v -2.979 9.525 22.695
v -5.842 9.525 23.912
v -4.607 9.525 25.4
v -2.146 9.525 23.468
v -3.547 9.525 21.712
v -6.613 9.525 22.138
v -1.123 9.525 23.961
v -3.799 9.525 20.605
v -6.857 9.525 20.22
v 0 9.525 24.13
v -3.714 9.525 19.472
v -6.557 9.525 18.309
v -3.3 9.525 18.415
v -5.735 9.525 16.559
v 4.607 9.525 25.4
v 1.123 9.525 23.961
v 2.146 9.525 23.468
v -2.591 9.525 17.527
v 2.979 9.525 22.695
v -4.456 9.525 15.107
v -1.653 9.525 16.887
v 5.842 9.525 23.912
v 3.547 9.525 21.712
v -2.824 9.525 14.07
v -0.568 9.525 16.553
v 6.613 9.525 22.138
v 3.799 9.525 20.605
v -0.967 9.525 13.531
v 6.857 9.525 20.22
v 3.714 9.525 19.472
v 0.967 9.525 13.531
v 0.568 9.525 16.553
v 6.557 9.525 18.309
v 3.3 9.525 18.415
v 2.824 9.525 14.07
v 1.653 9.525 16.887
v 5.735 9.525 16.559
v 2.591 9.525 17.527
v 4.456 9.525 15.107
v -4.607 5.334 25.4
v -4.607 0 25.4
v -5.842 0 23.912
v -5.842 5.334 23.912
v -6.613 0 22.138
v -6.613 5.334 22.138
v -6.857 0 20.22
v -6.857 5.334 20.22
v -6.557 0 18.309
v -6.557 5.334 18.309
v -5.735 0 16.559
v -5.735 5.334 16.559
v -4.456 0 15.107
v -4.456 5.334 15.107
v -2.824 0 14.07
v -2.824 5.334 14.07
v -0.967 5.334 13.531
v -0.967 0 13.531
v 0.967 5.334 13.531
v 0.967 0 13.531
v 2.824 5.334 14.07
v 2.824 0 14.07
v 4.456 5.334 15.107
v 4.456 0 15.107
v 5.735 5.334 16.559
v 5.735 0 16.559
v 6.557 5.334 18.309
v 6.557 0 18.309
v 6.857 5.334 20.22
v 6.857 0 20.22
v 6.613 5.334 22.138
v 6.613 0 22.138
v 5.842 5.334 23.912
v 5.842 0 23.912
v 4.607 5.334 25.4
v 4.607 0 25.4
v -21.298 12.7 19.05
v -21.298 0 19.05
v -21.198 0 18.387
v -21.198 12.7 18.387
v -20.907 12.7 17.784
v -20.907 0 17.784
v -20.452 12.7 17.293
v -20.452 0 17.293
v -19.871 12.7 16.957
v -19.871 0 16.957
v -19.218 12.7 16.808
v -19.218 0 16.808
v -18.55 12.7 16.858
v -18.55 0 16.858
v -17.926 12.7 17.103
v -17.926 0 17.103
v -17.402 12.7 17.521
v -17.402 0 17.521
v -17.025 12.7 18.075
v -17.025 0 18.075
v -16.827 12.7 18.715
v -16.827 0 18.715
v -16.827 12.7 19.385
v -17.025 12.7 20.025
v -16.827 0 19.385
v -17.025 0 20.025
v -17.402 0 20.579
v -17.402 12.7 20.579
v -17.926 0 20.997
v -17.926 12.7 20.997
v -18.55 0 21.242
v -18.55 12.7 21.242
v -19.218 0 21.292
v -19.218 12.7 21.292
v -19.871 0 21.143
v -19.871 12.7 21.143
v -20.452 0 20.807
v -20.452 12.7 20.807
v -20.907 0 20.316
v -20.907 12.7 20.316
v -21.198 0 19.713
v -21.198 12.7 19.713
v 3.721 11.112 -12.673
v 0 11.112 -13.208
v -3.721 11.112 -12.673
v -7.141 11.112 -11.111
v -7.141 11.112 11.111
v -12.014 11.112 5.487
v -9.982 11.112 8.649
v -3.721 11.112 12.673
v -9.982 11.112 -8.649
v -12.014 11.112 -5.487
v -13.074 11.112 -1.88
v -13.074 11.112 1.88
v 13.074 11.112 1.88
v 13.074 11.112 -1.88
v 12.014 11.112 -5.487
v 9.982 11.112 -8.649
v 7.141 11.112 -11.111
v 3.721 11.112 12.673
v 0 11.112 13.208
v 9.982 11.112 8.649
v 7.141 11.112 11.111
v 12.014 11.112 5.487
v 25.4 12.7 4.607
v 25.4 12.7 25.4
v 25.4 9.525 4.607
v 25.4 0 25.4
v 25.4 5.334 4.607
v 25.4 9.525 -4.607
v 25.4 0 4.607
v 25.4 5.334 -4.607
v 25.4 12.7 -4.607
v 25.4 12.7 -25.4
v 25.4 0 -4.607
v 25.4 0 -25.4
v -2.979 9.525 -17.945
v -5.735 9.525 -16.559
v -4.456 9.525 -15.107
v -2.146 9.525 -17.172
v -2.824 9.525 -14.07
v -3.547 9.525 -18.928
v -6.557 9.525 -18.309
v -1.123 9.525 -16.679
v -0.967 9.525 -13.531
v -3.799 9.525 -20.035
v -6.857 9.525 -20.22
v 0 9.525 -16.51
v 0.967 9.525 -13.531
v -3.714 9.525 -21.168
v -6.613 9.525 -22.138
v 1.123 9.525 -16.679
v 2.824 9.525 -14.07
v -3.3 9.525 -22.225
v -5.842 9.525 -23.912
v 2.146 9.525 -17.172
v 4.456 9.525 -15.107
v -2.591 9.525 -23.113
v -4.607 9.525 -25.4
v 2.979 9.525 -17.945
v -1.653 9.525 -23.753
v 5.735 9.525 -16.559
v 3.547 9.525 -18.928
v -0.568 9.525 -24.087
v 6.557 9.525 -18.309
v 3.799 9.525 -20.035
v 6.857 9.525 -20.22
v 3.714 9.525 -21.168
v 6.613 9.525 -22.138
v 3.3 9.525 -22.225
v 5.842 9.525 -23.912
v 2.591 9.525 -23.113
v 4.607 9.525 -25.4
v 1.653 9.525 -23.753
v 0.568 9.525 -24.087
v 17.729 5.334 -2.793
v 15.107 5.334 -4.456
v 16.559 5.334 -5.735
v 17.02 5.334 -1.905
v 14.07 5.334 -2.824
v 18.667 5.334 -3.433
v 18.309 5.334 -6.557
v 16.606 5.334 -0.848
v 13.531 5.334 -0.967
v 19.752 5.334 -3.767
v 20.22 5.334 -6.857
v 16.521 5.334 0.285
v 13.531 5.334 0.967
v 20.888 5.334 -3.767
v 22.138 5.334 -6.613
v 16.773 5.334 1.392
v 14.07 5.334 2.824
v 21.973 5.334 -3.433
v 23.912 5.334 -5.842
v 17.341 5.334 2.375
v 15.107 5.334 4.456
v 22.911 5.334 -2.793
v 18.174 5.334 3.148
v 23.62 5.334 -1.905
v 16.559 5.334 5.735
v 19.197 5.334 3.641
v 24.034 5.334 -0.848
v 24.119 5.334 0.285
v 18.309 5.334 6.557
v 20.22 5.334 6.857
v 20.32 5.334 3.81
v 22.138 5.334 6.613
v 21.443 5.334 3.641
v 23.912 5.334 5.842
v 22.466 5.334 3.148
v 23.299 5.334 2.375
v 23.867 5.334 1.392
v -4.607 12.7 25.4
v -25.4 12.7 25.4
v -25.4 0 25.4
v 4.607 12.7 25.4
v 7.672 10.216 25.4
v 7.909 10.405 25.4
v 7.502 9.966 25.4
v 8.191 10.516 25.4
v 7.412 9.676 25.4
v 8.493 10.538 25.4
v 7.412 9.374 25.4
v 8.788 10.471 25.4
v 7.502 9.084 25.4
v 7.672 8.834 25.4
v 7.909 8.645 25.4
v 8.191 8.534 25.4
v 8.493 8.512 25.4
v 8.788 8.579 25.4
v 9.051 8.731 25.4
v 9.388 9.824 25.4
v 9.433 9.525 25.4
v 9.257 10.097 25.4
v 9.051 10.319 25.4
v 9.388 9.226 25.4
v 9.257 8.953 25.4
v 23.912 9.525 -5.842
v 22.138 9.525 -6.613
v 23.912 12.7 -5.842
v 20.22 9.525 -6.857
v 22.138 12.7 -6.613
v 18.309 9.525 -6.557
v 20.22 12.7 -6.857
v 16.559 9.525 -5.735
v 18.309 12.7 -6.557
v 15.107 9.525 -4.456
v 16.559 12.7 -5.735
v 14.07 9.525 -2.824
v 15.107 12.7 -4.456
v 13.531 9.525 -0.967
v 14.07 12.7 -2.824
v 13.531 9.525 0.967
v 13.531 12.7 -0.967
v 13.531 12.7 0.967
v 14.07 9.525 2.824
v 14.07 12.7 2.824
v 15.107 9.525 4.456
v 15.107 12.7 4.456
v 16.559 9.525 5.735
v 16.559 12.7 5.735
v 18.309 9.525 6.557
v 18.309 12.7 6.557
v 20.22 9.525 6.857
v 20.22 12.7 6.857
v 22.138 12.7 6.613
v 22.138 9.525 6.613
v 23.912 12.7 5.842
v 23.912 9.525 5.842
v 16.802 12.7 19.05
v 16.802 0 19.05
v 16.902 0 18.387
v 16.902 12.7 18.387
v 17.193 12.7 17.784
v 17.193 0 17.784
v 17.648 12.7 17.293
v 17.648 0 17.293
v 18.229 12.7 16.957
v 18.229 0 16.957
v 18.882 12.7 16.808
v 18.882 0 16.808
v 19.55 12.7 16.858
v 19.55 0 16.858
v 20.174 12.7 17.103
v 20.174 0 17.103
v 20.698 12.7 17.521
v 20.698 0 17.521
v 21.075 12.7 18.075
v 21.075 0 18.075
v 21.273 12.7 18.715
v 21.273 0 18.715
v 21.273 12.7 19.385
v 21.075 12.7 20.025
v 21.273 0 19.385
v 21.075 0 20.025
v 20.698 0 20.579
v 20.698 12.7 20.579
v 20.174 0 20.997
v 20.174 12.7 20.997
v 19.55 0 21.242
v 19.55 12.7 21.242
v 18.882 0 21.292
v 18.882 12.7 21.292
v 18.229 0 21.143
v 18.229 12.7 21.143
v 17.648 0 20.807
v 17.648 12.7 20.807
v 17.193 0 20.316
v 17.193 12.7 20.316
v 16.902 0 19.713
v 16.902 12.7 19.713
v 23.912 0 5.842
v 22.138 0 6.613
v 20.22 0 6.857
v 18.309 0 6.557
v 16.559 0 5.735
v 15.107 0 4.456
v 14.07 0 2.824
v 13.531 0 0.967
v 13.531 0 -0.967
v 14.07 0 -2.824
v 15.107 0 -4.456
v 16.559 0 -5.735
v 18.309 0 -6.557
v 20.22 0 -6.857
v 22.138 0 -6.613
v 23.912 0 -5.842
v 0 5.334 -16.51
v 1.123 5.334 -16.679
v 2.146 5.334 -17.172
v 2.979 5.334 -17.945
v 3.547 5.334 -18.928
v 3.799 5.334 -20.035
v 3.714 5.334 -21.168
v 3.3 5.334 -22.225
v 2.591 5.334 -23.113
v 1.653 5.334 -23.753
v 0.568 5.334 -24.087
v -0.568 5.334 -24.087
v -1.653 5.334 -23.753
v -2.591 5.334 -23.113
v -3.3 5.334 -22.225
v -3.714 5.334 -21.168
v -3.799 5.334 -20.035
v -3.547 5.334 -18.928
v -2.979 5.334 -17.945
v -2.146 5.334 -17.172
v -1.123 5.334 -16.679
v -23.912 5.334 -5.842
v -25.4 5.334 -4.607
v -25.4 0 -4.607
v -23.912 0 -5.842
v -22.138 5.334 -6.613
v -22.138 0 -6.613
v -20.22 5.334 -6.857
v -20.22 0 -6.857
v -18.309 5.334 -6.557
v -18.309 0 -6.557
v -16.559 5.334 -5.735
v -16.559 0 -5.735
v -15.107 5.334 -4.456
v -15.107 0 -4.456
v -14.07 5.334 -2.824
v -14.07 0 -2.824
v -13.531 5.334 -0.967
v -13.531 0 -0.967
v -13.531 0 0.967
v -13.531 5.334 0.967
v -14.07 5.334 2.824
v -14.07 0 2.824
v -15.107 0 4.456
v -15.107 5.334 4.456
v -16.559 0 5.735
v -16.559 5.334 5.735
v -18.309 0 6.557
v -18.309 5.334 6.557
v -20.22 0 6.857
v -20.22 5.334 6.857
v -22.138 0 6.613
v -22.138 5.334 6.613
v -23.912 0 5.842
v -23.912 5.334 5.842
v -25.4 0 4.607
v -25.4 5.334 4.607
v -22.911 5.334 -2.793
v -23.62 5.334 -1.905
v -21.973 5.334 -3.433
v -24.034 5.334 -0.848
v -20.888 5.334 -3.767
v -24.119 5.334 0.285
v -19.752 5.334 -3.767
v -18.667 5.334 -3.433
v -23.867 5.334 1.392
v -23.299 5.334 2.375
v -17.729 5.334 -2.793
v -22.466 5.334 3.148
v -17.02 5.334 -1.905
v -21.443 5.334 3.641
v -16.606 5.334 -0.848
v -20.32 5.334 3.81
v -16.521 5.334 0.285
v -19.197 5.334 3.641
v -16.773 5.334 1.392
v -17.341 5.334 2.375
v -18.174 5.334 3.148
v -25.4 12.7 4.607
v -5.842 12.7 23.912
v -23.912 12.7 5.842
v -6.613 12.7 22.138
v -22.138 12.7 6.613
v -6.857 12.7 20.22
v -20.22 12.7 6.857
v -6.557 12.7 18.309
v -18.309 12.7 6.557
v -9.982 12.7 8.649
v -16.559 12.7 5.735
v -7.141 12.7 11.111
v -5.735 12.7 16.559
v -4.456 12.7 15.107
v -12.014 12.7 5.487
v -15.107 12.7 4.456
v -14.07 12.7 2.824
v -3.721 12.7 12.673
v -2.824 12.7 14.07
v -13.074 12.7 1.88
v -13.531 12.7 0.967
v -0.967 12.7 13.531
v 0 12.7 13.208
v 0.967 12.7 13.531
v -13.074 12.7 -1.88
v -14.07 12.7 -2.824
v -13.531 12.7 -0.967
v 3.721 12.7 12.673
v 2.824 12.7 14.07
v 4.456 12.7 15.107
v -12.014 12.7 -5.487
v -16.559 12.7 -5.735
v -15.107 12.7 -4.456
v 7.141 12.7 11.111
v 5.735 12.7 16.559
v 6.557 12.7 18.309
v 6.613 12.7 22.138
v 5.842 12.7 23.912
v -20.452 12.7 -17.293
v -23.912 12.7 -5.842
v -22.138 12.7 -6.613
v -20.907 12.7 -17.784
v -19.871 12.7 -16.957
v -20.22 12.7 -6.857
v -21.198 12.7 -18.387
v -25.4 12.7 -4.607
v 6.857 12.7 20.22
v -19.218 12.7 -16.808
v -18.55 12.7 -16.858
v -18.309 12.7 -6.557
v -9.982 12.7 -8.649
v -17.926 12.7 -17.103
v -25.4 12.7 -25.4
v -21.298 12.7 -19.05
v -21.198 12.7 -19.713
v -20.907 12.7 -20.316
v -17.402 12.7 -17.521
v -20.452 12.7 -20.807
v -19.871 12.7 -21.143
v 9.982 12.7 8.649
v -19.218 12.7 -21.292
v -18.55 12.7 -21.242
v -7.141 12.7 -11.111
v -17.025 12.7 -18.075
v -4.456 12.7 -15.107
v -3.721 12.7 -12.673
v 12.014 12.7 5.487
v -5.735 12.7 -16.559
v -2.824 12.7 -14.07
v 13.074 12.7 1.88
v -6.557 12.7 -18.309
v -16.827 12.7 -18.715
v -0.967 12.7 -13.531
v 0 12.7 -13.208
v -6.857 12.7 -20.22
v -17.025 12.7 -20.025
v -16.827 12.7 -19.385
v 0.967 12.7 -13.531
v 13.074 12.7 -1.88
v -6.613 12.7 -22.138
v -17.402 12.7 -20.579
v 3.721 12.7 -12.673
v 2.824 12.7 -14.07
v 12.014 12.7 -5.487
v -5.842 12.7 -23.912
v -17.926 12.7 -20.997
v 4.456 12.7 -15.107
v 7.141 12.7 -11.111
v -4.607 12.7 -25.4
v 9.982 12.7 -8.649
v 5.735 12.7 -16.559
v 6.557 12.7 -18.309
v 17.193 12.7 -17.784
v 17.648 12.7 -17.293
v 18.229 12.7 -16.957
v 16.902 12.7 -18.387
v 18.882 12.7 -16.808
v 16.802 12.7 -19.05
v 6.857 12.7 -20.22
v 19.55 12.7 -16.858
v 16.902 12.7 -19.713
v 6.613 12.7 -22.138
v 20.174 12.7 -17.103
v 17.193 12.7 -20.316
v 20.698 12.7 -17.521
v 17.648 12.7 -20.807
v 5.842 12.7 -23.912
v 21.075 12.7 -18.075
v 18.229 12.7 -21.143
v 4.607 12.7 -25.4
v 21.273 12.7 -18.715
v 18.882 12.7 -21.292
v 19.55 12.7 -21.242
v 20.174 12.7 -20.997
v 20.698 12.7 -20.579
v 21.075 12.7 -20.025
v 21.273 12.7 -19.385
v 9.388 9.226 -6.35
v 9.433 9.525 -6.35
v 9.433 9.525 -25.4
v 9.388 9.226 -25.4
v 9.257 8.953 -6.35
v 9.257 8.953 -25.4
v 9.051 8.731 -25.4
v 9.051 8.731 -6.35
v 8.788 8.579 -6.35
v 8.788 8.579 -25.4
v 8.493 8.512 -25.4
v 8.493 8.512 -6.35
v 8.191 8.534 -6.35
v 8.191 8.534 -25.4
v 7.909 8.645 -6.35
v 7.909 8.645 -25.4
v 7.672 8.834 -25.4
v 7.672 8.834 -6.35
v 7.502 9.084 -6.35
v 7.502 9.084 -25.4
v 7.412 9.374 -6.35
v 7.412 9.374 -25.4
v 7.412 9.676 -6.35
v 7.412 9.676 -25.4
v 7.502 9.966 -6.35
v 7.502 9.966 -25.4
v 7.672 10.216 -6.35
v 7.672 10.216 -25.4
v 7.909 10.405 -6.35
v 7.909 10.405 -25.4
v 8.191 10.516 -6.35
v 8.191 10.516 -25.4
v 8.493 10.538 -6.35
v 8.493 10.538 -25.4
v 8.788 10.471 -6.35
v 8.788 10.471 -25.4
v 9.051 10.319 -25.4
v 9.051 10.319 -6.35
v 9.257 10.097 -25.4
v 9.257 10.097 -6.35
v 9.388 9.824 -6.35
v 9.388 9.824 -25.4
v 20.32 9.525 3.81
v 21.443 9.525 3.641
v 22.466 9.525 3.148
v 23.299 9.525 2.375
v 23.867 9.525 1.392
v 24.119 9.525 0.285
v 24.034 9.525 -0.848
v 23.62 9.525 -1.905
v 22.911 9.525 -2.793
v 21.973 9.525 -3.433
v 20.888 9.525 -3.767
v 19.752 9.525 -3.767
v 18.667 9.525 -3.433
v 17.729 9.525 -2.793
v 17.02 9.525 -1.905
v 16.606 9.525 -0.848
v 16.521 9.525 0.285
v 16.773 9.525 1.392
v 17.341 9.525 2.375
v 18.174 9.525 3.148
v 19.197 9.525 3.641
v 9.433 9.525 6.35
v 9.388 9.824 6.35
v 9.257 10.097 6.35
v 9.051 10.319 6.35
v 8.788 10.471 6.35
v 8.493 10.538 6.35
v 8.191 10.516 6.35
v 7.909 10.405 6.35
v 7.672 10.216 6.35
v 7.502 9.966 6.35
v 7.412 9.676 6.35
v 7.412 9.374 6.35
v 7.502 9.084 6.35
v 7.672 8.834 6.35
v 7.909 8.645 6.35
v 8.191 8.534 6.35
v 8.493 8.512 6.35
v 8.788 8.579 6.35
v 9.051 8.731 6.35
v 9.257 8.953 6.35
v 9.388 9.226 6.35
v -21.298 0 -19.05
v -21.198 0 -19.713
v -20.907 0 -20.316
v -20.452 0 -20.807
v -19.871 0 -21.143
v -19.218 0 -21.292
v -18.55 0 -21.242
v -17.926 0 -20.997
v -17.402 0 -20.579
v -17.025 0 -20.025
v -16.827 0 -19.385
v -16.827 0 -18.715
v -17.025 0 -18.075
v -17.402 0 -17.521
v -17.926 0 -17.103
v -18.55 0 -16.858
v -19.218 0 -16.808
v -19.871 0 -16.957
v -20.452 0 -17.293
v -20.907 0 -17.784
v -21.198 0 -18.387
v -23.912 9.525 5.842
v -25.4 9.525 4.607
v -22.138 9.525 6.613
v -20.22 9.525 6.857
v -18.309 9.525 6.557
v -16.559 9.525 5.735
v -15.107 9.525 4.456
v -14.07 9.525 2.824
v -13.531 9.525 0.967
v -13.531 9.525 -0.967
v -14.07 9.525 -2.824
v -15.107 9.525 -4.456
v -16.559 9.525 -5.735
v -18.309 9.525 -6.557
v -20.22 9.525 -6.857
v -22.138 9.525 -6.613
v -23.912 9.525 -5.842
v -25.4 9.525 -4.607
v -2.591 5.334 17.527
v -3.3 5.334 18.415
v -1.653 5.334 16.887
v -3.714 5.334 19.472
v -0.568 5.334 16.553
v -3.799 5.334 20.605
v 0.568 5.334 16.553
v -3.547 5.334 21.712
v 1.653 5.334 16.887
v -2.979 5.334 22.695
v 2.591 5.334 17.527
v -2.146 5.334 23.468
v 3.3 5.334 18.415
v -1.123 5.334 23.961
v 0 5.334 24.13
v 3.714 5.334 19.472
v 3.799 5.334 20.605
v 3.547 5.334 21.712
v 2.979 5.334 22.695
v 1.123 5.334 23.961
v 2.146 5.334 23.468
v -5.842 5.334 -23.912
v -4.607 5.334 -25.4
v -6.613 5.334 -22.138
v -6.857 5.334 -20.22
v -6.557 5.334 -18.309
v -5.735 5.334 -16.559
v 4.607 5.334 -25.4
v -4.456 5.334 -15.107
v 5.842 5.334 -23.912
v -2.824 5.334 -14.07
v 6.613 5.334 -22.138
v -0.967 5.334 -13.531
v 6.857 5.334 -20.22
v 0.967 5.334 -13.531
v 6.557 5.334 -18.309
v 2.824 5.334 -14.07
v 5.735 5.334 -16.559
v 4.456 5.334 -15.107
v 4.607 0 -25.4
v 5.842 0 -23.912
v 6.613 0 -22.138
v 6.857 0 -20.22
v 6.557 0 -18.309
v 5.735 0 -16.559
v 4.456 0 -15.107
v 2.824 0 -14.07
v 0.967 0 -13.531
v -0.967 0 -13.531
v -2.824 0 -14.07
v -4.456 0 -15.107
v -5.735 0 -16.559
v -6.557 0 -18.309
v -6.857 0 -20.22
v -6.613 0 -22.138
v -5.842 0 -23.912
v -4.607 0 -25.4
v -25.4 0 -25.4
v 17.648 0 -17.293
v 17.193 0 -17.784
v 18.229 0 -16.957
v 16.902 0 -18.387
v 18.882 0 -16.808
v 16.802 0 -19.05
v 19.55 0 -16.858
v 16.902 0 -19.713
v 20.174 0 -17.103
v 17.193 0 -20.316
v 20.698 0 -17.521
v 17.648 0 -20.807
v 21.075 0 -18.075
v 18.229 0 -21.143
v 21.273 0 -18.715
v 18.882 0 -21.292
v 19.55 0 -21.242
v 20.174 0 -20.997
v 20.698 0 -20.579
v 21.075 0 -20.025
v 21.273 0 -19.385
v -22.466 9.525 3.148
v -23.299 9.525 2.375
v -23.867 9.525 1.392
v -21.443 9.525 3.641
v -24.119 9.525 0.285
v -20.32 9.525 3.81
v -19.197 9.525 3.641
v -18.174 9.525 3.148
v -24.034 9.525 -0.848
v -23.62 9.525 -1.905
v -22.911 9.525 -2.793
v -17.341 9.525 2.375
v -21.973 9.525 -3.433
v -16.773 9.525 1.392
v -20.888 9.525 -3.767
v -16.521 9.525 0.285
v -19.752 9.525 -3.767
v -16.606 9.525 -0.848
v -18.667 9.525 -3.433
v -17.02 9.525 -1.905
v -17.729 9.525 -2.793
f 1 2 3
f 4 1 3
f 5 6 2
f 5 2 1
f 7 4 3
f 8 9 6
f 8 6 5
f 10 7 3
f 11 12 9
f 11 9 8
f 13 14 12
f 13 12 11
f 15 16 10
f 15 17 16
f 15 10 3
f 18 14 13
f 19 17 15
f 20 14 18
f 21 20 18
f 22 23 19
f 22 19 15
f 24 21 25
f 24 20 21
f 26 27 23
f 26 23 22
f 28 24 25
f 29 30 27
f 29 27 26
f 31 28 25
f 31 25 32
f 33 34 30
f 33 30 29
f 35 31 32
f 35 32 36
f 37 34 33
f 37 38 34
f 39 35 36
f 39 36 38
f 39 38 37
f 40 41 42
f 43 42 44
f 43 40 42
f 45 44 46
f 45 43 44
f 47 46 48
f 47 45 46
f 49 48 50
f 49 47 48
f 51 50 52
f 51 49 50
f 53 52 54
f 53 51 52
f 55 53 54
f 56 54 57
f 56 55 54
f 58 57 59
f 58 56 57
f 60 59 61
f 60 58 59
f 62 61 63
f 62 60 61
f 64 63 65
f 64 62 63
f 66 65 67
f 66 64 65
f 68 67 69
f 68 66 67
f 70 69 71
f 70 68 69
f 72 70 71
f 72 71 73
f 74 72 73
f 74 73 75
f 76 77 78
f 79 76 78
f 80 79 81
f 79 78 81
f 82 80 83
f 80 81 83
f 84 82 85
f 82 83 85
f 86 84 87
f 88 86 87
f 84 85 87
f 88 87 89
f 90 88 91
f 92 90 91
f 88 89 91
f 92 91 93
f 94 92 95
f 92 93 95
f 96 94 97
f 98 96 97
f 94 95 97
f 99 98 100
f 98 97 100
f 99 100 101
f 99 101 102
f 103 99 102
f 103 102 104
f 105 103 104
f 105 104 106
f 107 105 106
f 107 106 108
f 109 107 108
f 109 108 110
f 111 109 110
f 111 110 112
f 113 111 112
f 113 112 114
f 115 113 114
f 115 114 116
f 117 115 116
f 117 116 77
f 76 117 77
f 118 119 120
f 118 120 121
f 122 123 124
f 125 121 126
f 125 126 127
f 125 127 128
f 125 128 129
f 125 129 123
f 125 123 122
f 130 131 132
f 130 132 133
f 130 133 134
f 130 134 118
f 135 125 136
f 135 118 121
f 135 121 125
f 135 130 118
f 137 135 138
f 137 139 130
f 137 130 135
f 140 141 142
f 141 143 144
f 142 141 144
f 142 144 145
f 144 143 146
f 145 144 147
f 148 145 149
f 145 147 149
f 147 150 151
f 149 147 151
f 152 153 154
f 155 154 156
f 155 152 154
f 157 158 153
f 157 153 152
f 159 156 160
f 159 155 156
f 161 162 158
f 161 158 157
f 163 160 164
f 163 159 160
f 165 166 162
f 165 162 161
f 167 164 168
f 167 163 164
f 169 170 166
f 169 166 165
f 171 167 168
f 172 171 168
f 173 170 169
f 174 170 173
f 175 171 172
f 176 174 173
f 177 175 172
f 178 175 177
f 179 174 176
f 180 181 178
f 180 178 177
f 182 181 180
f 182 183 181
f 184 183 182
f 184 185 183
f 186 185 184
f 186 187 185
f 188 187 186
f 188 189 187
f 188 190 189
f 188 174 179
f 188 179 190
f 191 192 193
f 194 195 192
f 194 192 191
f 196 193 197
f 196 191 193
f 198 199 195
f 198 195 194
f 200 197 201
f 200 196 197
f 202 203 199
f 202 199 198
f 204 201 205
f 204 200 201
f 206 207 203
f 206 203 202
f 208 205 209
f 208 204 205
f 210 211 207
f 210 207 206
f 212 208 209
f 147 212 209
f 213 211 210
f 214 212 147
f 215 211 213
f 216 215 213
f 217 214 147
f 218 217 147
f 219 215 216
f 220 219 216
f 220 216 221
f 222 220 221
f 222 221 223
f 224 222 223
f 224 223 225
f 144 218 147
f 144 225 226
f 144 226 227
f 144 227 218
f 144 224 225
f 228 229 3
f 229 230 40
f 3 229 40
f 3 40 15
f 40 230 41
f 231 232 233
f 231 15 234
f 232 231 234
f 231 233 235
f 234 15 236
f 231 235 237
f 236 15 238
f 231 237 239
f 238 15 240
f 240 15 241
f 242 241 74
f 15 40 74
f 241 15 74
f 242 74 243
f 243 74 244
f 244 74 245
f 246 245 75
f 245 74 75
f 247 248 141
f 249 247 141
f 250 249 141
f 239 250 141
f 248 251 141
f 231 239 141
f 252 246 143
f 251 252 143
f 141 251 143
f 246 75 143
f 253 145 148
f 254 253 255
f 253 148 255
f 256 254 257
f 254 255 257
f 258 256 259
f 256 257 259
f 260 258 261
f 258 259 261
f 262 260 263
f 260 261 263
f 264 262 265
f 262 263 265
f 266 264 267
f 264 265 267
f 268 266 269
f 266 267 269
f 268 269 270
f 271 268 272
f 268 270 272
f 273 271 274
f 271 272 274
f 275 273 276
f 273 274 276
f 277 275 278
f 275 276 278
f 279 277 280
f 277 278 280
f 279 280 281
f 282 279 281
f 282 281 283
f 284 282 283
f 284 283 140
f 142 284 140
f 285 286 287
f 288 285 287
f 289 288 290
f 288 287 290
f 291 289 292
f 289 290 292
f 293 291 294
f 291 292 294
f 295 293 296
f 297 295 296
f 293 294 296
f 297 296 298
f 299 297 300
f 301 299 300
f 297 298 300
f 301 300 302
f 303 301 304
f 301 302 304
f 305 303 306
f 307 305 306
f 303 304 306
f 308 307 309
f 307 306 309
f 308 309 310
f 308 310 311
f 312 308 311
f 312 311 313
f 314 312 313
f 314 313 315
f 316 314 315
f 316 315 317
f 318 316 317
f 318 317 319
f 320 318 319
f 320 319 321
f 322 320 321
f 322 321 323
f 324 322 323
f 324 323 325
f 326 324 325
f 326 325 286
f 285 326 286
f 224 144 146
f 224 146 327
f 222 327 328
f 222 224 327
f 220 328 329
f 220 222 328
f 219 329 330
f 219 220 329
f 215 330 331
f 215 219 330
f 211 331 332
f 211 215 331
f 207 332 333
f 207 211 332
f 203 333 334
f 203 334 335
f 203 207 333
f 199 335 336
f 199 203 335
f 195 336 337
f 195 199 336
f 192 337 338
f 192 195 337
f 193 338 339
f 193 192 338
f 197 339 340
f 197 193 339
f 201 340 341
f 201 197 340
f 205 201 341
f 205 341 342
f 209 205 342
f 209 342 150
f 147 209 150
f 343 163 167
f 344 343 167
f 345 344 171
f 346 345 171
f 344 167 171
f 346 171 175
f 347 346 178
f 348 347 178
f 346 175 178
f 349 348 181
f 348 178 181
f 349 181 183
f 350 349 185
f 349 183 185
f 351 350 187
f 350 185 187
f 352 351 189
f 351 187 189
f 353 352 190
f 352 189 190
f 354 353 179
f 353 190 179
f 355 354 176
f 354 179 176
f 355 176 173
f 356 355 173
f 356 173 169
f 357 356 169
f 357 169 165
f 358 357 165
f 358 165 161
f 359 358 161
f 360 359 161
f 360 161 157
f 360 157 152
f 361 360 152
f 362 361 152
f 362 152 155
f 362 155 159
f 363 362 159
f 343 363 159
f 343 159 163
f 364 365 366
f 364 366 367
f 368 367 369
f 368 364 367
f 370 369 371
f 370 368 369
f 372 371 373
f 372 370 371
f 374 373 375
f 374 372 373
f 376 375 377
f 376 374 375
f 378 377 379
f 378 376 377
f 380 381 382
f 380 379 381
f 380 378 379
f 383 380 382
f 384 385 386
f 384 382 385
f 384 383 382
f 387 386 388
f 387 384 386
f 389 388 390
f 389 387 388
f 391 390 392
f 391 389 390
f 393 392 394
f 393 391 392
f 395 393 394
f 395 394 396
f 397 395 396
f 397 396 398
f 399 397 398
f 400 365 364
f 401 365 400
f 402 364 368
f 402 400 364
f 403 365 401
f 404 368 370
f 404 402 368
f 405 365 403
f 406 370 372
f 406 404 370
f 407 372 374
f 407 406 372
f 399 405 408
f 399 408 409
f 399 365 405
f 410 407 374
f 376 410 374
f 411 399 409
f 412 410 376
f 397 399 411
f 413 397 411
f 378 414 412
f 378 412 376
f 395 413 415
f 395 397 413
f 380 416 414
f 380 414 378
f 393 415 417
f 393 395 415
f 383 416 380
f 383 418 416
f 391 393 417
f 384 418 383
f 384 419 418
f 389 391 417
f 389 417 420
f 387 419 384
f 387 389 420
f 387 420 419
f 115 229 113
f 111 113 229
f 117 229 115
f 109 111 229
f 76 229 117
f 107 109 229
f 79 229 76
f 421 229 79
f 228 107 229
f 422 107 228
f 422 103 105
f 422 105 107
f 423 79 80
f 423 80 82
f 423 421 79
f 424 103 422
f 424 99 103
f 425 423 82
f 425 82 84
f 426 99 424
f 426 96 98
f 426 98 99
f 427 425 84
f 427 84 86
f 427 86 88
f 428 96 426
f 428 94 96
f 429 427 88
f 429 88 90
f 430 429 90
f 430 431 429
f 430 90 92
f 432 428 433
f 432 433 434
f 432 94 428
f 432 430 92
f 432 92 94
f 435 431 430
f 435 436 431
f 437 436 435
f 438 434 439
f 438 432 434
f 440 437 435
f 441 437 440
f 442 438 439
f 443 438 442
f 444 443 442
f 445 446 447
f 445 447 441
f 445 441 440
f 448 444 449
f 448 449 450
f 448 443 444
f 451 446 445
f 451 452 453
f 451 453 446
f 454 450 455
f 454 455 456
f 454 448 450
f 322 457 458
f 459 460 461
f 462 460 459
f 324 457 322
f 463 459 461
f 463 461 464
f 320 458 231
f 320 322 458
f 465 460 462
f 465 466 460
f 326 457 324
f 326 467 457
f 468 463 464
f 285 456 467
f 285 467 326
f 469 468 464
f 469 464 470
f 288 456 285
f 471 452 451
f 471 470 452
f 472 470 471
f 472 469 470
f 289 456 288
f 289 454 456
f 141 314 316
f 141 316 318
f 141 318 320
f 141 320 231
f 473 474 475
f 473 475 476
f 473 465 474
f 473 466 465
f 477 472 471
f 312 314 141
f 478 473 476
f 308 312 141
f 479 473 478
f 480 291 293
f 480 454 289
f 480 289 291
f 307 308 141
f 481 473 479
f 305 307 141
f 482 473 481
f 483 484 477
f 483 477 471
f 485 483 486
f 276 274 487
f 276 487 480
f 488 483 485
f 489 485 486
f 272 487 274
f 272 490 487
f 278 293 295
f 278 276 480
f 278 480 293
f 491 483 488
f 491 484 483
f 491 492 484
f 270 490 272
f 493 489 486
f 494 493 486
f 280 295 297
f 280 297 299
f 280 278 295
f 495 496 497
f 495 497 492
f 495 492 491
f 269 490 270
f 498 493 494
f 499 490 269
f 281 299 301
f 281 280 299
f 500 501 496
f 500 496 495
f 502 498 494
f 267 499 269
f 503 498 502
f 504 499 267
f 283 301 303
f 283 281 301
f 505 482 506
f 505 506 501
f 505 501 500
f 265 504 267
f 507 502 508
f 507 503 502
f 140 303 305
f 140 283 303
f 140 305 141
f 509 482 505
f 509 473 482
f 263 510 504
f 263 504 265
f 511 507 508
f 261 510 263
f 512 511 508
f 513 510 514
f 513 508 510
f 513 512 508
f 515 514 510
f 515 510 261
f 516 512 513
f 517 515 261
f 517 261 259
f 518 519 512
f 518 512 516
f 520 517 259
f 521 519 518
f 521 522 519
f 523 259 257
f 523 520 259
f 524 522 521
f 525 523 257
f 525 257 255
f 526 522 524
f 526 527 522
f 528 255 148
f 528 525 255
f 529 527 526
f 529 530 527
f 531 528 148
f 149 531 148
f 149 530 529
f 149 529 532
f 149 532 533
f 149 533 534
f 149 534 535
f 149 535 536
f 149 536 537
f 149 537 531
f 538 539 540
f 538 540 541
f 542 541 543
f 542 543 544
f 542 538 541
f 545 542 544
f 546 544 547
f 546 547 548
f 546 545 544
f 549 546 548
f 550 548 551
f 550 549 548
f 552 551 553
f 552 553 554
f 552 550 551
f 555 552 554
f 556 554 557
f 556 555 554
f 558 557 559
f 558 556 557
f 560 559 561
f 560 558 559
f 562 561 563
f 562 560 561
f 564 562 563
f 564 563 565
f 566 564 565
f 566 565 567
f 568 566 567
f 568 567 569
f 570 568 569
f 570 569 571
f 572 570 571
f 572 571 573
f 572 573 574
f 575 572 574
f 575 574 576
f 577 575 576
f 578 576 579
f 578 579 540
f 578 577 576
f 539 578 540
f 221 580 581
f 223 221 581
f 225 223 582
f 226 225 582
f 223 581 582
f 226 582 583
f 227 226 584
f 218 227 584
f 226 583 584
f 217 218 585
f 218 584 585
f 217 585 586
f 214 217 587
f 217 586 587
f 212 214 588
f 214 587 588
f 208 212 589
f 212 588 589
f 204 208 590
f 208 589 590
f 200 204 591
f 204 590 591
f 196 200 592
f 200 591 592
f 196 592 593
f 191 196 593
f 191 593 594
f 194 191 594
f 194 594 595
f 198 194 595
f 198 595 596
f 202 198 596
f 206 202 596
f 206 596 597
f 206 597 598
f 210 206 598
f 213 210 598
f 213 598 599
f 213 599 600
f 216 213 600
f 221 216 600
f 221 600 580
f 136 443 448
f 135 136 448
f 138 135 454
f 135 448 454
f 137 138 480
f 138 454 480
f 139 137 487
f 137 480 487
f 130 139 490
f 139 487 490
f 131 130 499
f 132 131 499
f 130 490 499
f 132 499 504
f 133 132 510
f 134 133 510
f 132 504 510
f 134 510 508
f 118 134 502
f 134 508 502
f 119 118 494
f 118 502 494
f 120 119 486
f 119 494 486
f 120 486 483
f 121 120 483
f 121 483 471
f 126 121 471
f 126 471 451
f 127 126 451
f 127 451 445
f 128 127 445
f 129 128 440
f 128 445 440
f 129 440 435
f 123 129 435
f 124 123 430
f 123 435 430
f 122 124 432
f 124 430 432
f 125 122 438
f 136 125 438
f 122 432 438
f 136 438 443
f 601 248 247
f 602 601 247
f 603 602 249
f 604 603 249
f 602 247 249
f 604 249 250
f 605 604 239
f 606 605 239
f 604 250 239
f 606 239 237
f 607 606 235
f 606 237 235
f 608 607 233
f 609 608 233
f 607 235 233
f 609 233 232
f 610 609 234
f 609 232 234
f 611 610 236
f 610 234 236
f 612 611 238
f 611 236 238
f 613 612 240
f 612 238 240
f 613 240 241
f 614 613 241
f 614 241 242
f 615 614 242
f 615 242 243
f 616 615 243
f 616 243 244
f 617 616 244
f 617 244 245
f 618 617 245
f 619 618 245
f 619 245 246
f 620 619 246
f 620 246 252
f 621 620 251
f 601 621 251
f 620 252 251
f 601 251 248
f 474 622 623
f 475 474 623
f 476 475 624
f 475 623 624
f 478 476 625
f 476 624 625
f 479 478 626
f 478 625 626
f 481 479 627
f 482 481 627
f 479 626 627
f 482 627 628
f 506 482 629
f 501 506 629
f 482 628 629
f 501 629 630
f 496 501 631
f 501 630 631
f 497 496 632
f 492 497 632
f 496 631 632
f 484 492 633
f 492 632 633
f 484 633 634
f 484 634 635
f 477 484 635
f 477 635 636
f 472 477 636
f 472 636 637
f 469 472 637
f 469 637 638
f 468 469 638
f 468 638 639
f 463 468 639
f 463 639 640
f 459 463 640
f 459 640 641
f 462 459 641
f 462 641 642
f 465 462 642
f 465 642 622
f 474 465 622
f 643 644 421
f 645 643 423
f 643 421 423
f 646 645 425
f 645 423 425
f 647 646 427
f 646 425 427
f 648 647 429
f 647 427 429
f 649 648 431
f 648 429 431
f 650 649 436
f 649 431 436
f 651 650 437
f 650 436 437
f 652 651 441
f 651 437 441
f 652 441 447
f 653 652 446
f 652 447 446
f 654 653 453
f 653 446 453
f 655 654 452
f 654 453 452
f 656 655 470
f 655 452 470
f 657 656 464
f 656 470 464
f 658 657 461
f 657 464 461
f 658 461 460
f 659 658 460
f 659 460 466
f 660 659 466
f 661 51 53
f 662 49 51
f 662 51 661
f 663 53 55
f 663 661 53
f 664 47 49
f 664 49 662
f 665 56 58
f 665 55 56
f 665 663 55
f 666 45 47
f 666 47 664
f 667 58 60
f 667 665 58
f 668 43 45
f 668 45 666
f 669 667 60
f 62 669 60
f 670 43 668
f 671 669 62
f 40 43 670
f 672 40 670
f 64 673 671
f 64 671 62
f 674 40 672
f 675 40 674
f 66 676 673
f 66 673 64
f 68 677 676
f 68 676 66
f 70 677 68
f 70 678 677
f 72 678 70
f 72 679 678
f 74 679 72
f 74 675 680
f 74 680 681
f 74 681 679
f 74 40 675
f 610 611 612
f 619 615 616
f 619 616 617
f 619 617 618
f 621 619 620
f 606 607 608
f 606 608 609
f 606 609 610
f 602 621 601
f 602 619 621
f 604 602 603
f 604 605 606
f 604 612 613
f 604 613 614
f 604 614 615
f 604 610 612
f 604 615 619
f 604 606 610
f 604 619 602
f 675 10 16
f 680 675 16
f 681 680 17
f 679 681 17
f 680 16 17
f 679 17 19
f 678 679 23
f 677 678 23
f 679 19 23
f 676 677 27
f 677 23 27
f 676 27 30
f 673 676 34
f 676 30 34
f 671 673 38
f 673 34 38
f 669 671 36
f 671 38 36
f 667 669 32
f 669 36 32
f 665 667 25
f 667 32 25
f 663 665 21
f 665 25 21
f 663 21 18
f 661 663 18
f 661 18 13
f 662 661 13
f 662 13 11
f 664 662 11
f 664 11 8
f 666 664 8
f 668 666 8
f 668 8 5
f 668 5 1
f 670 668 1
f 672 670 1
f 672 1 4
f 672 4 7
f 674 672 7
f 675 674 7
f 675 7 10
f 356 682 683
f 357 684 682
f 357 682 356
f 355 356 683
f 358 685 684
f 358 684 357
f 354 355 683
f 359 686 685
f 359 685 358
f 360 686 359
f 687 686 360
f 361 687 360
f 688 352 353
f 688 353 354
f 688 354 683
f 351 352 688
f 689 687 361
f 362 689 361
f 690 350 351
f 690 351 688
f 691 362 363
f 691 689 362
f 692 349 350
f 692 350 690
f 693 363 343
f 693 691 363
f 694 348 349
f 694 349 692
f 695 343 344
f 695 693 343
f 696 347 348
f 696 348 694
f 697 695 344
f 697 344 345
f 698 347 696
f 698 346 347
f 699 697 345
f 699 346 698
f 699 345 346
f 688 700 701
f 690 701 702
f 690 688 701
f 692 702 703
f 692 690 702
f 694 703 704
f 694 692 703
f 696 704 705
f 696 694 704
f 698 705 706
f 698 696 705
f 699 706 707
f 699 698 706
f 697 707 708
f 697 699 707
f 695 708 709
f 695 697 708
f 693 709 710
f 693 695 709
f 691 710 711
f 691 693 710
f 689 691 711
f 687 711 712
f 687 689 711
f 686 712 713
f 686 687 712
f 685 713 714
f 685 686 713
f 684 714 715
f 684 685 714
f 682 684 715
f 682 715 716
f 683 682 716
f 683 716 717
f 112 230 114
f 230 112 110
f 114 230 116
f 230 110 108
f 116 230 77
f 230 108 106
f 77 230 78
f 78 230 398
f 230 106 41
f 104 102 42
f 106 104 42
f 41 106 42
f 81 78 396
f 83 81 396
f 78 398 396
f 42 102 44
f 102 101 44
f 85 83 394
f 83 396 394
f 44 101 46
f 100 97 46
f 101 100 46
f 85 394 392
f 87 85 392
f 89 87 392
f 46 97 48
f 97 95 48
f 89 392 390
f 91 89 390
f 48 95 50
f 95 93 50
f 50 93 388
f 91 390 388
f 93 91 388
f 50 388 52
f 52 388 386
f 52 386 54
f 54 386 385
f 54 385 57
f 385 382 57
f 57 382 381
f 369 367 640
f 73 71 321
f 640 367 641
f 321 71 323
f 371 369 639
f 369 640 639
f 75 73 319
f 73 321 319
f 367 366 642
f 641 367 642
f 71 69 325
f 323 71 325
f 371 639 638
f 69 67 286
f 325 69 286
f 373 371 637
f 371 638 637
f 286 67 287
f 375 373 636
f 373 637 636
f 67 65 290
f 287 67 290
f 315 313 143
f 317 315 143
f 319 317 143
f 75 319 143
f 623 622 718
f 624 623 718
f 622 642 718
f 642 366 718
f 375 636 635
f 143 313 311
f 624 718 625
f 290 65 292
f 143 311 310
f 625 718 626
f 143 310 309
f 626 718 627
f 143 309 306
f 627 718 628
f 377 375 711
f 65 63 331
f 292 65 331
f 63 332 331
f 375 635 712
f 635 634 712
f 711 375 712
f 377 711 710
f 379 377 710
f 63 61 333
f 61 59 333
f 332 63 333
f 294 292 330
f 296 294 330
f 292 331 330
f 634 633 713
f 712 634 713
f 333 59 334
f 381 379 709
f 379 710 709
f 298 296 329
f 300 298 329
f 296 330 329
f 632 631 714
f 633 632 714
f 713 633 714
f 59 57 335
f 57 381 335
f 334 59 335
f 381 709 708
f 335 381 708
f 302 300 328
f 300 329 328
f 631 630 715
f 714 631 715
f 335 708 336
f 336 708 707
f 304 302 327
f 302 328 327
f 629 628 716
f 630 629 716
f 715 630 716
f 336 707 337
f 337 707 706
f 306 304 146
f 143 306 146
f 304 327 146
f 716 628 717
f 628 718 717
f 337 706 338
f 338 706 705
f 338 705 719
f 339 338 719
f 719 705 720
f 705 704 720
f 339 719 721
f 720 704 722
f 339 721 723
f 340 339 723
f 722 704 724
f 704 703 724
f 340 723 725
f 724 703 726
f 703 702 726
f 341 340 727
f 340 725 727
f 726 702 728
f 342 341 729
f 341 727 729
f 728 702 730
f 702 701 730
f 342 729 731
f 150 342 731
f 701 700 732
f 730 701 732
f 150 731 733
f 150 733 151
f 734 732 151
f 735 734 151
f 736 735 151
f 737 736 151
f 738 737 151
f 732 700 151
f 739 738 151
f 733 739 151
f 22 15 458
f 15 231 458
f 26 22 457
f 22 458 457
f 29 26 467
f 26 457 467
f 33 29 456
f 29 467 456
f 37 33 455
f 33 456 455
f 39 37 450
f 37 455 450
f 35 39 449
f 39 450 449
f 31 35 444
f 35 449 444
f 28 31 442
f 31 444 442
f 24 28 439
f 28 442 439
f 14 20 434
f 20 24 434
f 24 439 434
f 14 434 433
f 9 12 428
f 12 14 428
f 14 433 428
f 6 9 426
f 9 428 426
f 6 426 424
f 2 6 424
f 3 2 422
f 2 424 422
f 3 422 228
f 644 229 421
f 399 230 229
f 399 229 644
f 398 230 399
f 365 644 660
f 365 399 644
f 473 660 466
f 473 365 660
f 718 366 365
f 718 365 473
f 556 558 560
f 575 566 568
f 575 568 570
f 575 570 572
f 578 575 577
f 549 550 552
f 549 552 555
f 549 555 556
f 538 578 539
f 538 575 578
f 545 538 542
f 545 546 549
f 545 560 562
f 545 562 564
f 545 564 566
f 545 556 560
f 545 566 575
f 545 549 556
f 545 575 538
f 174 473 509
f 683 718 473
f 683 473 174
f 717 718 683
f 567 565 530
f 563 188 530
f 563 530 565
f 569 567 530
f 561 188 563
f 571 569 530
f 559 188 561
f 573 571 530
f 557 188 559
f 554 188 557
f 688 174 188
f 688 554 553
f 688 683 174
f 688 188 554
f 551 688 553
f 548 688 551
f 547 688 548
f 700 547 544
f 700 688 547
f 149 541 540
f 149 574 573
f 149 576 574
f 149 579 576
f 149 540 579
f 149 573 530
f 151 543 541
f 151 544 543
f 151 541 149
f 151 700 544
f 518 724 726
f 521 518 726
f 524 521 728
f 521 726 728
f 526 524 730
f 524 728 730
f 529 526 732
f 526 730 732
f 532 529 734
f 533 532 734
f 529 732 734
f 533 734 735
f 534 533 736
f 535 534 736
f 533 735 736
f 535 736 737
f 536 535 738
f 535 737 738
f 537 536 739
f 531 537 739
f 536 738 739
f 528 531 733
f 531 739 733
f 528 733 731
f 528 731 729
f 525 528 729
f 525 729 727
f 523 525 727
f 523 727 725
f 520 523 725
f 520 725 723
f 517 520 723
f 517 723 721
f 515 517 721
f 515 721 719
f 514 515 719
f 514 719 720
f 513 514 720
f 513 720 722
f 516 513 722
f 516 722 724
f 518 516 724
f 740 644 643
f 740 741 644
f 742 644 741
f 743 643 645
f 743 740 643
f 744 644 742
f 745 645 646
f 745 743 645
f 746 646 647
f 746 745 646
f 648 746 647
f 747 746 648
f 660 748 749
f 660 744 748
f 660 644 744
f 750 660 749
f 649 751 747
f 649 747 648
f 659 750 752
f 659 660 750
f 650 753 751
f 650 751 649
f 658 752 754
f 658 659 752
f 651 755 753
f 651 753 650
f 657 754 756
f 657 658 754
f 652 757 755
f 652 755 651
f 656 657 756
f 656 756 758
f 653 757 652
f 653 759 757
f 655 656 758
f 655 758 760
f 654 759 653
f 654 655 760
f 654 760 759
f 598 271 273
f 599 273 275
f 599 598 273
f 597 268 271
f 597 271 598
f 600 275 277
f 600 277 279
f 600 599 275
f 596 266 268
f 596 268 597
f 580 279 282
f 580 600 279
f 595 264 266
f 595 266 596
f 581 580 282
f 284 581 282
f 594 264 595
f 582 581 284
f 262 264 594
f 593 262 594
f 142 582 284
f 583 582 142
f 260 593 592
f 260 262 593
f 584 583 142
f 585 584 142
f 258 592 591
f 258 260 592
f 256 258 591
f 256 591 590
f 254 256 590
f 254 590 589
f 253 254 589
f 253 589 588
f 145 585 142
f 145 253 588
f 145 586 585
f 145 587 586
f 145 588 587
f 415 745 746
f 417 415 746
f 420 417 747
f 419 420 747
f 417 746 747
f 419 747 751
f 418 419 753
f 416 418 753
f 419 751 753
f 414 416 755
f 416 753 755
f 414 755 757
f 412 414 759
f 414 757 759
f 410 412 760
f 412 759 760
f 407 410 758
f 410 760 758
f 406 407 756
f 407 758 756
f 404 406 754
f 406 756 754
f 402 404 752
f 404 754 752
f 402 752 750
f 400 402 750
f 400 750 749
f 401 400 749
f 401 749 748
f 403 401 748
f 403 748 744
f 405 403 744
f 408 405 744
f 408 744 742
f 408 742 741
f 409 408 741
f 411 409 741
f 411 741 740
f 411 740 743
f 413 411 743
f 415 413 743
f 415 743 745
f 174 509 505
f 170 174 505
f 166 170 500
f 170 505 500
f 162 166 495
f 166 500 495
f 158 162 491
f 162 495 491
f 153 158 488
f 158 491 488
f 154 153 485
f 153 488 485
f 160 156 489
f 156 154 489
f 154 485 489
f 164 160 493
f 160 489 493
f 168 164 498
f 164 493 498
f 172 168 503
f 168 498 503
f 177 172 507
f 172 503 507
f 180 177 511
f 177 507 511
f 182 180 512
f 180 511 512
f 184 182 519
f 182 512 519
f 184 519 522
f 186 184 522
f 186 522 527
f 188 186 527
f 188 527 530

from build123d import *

# Parameters (mm, degrees)
SKETCH1_W             = 50.8
SKETCH1_H             = 50.8
BOSS_EXTRUDE1_DEPTH   = 12.7
F_8_CLEARANCE_HOLE1_D = 4.4958
SKETCH5_R             = 13.208
CUT_EXTRUDE1_DEPTH    = 1.5875
SKETCH6_R             = 3.81
CUT_EXTRUDE2_DEPTH    = 39.1
SKETCH10_R            = 6.858
CUT_EXTRUDE3_DEPTH    = 3.175
CUT_EXTRUDE4_START    = -5.334
SKETCH11_R            = 6.858
CUT_EXTRUDE4_DEPTH    = 5.334
SKETCH12_R            = 1.016
CUT_EXTRUDE5_DEPTH    = 19.05
CUT_EXTRUDE6_START    = -19.05
SKETCH13_R            = 1.016
CUT_EXTRUDE6_DEPTH    = 19.05


with BuildPart() as part:
    # Sketch1 → Boss-Extrude1 (new body)
    with BuildSketch(Plane(origin=(0, 0, 0), x_dir=(1, 0, 0), z_dir=(0, 1, 0))):
        Rectangle(SKETCH1_W, SKETCH1_H)
    extrude(amount=BOSS_EXTRUDE1_DEPTH)

    # #8 Clearance Hole1 (through all)
    with Locations(Plane(origin=(0, 12.7, 0), x_dir=(1, 0, 0), z_dir=(0, 1, 0))):
        with Locations((-19.05, -19.05), (-19.05, 19.05), (19.05, 19.05), (19.05, -19.05)):
            Hole(F_8_CLEARANCE_HOLE1_D / 2)

    # Sketch5 → Cut-Extrude1 (cut)
    with BuildSketch(Plane(origin=(0, 12.7, 0), x_dir=(1, 0, 0), z_dir=(0, 1, 0))):
        with Locations(Location((0, 0, 0), (0, 0, 270))):
            Circle(SKETCH5_R)
    extrude(amount=-CUT_EXTRUDE1_DEPTH, mode=Mode.SUBTRACT)

    # Sketch6 → Cut-Extrude2 (cut, through all)
    with BuildSketch(Plane(origin=(0, 12.7, 0), x_dir=(1, 0, 0), z_dir=(0, 1, 0))):
        with Locations(Location((0, 20.32, 0), (0, 0, 270))):
            Circle(SKETCH6_R)
        with Locations(Location((20.32, 0, 0), (0, 0, 270))):
            Circle(SKETCH6_R)
        with Locations(Location((0, -20.32, 0), (0, 0, 270))):
            Circle(SKETCH6_R)
        with Locations(Location((-20.32, 0, 0), (0, 0, 270))):
            Circle(SKETCH6_R)
    extrude(amount=-CUT_EXTRUDE2_DEPTH, mode=Mode.SUBTRACT)

    # Sketch10 → Cut-Extrude3 (cut)
    with BuildSketch(Plane(origin=(0, 12.7, 0), x_dir=(1, 0, 0), z_dir=(0, 1, 0))):
        with Locations((-20.32, 0)):
            Circle(SKETCH10_R)
        with Locations((0, 20.32)):
            Circle(SKETCH10_R)
        with Locations((20.32, 0)):
            Circle(SKETCH10_R)
        with Locations((0, -20.32)):
            Circle(SKETCH10_R)
    extrude(amount=-CUT_EXTRUDE3_DEPTH, mode=Mode.SUBTRACT)

    # Sketch11 → Cut-Extrude4 (cut)
    with BuildSketch(Plane.XZ.offset(CUT_EXTRUDE4_START)):
        with Locations((-20.32, 0)):
            Circle(SKETCH11_R)
        with Locations((0, 20.32)):
            Circle(SKETCH11_R)
        with Locations((20.32, 0)):
            Circle(SKETCH11_R)
        with Locations((0, -20.32)):
            Circle(SKETCH11_R)
    extrude(amount=CUT_EXTRUDE4_DEPTH, mode=Mode.SUBTRACT)

    # Sketch12 → Cut-Extrude5 (cut)
    with BuildSketch(Plane.XY.offset(25.4)):
        with Locations((8.417142715, 9.525)):
            Circle(SKETCH12_R)
    extrude(amount=-CUT_EXTRUDE5_DEPTH, mode=Mode.SUBTRACT)

    # Sketch13 → Cut-Extrude6 (cut)
    with BuildSketch(Plane(origin=(0, 0, -25.4), x_dir=(-1, 0, 0), z_dir=(0, 0, -1)).offset(CUT_EXTRUDE6_START)):
        with Locations(Location((-8.417142715, 9.525, 0), (0, 0, 180))):
            Circle(SKETCH13_R)
    extrude(amount=CUT_EXTRUDE6_DEPTH, mode=Mode.SUBTRACT)


solid = part.part
